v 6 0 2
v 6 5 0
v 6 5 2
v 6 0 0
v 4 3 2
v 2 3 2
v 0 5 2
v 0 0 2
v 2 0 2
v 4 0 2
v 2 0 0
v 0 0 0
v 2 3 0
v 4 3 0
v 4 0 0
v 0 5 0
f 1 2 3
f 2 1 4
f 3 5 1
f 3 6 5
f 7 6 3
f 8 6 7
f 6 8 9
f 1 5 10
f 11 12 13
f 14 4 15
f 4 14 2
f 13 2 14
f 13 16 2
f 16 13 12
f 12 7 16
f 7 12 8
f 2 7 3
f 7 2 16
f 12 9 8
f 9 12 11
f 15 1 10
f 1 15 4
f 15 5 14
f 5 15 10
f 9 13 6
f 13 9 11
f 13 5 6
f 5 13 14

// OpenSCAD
// file: BusinessCardBoxVars.scad
$fn=128;
Wall=3;
/* Business Card Box
InnerW_X=87;
InnerD_Y=57;
InnerH_Z=65;
*/

/* Small Box */
InnerW_X=43;
InnerD_Y=28;
InnerH_Z=32;


DW=Wall*2;
HightZ=InnerH_Z+DW;
LengthX=InnerW_X+DW;
WidthY=InnerD_Y+DW;

TW=Wall*3;
HW=Wall/2;
HingePinDia=2;
NumHinge=8;
HL=LengthX/2;
Buff=1;
DB=Buff*2;

FrontHingeLatch = 2;
FrontHingeW = FrontHingeLatch*3;
HFH = FrontHingeW/2;
HFHL = FrontHingeLatch/2;
LatchH=HingePinDia*2;

LockDia = 3;
DLD = LockDia+4;
PenUHinge = NumHinge-1;
AntPenUHinge = NumHinge-2;
// main file
include <BusinessCardBoxVars.scad>;


difference()
{
  translate([0,0,0]) cube([FrontHingeW,5,2]);
  translate([2,-Buff,-Buff]) cube([FrontHingeLatch,4,DW]);
}
